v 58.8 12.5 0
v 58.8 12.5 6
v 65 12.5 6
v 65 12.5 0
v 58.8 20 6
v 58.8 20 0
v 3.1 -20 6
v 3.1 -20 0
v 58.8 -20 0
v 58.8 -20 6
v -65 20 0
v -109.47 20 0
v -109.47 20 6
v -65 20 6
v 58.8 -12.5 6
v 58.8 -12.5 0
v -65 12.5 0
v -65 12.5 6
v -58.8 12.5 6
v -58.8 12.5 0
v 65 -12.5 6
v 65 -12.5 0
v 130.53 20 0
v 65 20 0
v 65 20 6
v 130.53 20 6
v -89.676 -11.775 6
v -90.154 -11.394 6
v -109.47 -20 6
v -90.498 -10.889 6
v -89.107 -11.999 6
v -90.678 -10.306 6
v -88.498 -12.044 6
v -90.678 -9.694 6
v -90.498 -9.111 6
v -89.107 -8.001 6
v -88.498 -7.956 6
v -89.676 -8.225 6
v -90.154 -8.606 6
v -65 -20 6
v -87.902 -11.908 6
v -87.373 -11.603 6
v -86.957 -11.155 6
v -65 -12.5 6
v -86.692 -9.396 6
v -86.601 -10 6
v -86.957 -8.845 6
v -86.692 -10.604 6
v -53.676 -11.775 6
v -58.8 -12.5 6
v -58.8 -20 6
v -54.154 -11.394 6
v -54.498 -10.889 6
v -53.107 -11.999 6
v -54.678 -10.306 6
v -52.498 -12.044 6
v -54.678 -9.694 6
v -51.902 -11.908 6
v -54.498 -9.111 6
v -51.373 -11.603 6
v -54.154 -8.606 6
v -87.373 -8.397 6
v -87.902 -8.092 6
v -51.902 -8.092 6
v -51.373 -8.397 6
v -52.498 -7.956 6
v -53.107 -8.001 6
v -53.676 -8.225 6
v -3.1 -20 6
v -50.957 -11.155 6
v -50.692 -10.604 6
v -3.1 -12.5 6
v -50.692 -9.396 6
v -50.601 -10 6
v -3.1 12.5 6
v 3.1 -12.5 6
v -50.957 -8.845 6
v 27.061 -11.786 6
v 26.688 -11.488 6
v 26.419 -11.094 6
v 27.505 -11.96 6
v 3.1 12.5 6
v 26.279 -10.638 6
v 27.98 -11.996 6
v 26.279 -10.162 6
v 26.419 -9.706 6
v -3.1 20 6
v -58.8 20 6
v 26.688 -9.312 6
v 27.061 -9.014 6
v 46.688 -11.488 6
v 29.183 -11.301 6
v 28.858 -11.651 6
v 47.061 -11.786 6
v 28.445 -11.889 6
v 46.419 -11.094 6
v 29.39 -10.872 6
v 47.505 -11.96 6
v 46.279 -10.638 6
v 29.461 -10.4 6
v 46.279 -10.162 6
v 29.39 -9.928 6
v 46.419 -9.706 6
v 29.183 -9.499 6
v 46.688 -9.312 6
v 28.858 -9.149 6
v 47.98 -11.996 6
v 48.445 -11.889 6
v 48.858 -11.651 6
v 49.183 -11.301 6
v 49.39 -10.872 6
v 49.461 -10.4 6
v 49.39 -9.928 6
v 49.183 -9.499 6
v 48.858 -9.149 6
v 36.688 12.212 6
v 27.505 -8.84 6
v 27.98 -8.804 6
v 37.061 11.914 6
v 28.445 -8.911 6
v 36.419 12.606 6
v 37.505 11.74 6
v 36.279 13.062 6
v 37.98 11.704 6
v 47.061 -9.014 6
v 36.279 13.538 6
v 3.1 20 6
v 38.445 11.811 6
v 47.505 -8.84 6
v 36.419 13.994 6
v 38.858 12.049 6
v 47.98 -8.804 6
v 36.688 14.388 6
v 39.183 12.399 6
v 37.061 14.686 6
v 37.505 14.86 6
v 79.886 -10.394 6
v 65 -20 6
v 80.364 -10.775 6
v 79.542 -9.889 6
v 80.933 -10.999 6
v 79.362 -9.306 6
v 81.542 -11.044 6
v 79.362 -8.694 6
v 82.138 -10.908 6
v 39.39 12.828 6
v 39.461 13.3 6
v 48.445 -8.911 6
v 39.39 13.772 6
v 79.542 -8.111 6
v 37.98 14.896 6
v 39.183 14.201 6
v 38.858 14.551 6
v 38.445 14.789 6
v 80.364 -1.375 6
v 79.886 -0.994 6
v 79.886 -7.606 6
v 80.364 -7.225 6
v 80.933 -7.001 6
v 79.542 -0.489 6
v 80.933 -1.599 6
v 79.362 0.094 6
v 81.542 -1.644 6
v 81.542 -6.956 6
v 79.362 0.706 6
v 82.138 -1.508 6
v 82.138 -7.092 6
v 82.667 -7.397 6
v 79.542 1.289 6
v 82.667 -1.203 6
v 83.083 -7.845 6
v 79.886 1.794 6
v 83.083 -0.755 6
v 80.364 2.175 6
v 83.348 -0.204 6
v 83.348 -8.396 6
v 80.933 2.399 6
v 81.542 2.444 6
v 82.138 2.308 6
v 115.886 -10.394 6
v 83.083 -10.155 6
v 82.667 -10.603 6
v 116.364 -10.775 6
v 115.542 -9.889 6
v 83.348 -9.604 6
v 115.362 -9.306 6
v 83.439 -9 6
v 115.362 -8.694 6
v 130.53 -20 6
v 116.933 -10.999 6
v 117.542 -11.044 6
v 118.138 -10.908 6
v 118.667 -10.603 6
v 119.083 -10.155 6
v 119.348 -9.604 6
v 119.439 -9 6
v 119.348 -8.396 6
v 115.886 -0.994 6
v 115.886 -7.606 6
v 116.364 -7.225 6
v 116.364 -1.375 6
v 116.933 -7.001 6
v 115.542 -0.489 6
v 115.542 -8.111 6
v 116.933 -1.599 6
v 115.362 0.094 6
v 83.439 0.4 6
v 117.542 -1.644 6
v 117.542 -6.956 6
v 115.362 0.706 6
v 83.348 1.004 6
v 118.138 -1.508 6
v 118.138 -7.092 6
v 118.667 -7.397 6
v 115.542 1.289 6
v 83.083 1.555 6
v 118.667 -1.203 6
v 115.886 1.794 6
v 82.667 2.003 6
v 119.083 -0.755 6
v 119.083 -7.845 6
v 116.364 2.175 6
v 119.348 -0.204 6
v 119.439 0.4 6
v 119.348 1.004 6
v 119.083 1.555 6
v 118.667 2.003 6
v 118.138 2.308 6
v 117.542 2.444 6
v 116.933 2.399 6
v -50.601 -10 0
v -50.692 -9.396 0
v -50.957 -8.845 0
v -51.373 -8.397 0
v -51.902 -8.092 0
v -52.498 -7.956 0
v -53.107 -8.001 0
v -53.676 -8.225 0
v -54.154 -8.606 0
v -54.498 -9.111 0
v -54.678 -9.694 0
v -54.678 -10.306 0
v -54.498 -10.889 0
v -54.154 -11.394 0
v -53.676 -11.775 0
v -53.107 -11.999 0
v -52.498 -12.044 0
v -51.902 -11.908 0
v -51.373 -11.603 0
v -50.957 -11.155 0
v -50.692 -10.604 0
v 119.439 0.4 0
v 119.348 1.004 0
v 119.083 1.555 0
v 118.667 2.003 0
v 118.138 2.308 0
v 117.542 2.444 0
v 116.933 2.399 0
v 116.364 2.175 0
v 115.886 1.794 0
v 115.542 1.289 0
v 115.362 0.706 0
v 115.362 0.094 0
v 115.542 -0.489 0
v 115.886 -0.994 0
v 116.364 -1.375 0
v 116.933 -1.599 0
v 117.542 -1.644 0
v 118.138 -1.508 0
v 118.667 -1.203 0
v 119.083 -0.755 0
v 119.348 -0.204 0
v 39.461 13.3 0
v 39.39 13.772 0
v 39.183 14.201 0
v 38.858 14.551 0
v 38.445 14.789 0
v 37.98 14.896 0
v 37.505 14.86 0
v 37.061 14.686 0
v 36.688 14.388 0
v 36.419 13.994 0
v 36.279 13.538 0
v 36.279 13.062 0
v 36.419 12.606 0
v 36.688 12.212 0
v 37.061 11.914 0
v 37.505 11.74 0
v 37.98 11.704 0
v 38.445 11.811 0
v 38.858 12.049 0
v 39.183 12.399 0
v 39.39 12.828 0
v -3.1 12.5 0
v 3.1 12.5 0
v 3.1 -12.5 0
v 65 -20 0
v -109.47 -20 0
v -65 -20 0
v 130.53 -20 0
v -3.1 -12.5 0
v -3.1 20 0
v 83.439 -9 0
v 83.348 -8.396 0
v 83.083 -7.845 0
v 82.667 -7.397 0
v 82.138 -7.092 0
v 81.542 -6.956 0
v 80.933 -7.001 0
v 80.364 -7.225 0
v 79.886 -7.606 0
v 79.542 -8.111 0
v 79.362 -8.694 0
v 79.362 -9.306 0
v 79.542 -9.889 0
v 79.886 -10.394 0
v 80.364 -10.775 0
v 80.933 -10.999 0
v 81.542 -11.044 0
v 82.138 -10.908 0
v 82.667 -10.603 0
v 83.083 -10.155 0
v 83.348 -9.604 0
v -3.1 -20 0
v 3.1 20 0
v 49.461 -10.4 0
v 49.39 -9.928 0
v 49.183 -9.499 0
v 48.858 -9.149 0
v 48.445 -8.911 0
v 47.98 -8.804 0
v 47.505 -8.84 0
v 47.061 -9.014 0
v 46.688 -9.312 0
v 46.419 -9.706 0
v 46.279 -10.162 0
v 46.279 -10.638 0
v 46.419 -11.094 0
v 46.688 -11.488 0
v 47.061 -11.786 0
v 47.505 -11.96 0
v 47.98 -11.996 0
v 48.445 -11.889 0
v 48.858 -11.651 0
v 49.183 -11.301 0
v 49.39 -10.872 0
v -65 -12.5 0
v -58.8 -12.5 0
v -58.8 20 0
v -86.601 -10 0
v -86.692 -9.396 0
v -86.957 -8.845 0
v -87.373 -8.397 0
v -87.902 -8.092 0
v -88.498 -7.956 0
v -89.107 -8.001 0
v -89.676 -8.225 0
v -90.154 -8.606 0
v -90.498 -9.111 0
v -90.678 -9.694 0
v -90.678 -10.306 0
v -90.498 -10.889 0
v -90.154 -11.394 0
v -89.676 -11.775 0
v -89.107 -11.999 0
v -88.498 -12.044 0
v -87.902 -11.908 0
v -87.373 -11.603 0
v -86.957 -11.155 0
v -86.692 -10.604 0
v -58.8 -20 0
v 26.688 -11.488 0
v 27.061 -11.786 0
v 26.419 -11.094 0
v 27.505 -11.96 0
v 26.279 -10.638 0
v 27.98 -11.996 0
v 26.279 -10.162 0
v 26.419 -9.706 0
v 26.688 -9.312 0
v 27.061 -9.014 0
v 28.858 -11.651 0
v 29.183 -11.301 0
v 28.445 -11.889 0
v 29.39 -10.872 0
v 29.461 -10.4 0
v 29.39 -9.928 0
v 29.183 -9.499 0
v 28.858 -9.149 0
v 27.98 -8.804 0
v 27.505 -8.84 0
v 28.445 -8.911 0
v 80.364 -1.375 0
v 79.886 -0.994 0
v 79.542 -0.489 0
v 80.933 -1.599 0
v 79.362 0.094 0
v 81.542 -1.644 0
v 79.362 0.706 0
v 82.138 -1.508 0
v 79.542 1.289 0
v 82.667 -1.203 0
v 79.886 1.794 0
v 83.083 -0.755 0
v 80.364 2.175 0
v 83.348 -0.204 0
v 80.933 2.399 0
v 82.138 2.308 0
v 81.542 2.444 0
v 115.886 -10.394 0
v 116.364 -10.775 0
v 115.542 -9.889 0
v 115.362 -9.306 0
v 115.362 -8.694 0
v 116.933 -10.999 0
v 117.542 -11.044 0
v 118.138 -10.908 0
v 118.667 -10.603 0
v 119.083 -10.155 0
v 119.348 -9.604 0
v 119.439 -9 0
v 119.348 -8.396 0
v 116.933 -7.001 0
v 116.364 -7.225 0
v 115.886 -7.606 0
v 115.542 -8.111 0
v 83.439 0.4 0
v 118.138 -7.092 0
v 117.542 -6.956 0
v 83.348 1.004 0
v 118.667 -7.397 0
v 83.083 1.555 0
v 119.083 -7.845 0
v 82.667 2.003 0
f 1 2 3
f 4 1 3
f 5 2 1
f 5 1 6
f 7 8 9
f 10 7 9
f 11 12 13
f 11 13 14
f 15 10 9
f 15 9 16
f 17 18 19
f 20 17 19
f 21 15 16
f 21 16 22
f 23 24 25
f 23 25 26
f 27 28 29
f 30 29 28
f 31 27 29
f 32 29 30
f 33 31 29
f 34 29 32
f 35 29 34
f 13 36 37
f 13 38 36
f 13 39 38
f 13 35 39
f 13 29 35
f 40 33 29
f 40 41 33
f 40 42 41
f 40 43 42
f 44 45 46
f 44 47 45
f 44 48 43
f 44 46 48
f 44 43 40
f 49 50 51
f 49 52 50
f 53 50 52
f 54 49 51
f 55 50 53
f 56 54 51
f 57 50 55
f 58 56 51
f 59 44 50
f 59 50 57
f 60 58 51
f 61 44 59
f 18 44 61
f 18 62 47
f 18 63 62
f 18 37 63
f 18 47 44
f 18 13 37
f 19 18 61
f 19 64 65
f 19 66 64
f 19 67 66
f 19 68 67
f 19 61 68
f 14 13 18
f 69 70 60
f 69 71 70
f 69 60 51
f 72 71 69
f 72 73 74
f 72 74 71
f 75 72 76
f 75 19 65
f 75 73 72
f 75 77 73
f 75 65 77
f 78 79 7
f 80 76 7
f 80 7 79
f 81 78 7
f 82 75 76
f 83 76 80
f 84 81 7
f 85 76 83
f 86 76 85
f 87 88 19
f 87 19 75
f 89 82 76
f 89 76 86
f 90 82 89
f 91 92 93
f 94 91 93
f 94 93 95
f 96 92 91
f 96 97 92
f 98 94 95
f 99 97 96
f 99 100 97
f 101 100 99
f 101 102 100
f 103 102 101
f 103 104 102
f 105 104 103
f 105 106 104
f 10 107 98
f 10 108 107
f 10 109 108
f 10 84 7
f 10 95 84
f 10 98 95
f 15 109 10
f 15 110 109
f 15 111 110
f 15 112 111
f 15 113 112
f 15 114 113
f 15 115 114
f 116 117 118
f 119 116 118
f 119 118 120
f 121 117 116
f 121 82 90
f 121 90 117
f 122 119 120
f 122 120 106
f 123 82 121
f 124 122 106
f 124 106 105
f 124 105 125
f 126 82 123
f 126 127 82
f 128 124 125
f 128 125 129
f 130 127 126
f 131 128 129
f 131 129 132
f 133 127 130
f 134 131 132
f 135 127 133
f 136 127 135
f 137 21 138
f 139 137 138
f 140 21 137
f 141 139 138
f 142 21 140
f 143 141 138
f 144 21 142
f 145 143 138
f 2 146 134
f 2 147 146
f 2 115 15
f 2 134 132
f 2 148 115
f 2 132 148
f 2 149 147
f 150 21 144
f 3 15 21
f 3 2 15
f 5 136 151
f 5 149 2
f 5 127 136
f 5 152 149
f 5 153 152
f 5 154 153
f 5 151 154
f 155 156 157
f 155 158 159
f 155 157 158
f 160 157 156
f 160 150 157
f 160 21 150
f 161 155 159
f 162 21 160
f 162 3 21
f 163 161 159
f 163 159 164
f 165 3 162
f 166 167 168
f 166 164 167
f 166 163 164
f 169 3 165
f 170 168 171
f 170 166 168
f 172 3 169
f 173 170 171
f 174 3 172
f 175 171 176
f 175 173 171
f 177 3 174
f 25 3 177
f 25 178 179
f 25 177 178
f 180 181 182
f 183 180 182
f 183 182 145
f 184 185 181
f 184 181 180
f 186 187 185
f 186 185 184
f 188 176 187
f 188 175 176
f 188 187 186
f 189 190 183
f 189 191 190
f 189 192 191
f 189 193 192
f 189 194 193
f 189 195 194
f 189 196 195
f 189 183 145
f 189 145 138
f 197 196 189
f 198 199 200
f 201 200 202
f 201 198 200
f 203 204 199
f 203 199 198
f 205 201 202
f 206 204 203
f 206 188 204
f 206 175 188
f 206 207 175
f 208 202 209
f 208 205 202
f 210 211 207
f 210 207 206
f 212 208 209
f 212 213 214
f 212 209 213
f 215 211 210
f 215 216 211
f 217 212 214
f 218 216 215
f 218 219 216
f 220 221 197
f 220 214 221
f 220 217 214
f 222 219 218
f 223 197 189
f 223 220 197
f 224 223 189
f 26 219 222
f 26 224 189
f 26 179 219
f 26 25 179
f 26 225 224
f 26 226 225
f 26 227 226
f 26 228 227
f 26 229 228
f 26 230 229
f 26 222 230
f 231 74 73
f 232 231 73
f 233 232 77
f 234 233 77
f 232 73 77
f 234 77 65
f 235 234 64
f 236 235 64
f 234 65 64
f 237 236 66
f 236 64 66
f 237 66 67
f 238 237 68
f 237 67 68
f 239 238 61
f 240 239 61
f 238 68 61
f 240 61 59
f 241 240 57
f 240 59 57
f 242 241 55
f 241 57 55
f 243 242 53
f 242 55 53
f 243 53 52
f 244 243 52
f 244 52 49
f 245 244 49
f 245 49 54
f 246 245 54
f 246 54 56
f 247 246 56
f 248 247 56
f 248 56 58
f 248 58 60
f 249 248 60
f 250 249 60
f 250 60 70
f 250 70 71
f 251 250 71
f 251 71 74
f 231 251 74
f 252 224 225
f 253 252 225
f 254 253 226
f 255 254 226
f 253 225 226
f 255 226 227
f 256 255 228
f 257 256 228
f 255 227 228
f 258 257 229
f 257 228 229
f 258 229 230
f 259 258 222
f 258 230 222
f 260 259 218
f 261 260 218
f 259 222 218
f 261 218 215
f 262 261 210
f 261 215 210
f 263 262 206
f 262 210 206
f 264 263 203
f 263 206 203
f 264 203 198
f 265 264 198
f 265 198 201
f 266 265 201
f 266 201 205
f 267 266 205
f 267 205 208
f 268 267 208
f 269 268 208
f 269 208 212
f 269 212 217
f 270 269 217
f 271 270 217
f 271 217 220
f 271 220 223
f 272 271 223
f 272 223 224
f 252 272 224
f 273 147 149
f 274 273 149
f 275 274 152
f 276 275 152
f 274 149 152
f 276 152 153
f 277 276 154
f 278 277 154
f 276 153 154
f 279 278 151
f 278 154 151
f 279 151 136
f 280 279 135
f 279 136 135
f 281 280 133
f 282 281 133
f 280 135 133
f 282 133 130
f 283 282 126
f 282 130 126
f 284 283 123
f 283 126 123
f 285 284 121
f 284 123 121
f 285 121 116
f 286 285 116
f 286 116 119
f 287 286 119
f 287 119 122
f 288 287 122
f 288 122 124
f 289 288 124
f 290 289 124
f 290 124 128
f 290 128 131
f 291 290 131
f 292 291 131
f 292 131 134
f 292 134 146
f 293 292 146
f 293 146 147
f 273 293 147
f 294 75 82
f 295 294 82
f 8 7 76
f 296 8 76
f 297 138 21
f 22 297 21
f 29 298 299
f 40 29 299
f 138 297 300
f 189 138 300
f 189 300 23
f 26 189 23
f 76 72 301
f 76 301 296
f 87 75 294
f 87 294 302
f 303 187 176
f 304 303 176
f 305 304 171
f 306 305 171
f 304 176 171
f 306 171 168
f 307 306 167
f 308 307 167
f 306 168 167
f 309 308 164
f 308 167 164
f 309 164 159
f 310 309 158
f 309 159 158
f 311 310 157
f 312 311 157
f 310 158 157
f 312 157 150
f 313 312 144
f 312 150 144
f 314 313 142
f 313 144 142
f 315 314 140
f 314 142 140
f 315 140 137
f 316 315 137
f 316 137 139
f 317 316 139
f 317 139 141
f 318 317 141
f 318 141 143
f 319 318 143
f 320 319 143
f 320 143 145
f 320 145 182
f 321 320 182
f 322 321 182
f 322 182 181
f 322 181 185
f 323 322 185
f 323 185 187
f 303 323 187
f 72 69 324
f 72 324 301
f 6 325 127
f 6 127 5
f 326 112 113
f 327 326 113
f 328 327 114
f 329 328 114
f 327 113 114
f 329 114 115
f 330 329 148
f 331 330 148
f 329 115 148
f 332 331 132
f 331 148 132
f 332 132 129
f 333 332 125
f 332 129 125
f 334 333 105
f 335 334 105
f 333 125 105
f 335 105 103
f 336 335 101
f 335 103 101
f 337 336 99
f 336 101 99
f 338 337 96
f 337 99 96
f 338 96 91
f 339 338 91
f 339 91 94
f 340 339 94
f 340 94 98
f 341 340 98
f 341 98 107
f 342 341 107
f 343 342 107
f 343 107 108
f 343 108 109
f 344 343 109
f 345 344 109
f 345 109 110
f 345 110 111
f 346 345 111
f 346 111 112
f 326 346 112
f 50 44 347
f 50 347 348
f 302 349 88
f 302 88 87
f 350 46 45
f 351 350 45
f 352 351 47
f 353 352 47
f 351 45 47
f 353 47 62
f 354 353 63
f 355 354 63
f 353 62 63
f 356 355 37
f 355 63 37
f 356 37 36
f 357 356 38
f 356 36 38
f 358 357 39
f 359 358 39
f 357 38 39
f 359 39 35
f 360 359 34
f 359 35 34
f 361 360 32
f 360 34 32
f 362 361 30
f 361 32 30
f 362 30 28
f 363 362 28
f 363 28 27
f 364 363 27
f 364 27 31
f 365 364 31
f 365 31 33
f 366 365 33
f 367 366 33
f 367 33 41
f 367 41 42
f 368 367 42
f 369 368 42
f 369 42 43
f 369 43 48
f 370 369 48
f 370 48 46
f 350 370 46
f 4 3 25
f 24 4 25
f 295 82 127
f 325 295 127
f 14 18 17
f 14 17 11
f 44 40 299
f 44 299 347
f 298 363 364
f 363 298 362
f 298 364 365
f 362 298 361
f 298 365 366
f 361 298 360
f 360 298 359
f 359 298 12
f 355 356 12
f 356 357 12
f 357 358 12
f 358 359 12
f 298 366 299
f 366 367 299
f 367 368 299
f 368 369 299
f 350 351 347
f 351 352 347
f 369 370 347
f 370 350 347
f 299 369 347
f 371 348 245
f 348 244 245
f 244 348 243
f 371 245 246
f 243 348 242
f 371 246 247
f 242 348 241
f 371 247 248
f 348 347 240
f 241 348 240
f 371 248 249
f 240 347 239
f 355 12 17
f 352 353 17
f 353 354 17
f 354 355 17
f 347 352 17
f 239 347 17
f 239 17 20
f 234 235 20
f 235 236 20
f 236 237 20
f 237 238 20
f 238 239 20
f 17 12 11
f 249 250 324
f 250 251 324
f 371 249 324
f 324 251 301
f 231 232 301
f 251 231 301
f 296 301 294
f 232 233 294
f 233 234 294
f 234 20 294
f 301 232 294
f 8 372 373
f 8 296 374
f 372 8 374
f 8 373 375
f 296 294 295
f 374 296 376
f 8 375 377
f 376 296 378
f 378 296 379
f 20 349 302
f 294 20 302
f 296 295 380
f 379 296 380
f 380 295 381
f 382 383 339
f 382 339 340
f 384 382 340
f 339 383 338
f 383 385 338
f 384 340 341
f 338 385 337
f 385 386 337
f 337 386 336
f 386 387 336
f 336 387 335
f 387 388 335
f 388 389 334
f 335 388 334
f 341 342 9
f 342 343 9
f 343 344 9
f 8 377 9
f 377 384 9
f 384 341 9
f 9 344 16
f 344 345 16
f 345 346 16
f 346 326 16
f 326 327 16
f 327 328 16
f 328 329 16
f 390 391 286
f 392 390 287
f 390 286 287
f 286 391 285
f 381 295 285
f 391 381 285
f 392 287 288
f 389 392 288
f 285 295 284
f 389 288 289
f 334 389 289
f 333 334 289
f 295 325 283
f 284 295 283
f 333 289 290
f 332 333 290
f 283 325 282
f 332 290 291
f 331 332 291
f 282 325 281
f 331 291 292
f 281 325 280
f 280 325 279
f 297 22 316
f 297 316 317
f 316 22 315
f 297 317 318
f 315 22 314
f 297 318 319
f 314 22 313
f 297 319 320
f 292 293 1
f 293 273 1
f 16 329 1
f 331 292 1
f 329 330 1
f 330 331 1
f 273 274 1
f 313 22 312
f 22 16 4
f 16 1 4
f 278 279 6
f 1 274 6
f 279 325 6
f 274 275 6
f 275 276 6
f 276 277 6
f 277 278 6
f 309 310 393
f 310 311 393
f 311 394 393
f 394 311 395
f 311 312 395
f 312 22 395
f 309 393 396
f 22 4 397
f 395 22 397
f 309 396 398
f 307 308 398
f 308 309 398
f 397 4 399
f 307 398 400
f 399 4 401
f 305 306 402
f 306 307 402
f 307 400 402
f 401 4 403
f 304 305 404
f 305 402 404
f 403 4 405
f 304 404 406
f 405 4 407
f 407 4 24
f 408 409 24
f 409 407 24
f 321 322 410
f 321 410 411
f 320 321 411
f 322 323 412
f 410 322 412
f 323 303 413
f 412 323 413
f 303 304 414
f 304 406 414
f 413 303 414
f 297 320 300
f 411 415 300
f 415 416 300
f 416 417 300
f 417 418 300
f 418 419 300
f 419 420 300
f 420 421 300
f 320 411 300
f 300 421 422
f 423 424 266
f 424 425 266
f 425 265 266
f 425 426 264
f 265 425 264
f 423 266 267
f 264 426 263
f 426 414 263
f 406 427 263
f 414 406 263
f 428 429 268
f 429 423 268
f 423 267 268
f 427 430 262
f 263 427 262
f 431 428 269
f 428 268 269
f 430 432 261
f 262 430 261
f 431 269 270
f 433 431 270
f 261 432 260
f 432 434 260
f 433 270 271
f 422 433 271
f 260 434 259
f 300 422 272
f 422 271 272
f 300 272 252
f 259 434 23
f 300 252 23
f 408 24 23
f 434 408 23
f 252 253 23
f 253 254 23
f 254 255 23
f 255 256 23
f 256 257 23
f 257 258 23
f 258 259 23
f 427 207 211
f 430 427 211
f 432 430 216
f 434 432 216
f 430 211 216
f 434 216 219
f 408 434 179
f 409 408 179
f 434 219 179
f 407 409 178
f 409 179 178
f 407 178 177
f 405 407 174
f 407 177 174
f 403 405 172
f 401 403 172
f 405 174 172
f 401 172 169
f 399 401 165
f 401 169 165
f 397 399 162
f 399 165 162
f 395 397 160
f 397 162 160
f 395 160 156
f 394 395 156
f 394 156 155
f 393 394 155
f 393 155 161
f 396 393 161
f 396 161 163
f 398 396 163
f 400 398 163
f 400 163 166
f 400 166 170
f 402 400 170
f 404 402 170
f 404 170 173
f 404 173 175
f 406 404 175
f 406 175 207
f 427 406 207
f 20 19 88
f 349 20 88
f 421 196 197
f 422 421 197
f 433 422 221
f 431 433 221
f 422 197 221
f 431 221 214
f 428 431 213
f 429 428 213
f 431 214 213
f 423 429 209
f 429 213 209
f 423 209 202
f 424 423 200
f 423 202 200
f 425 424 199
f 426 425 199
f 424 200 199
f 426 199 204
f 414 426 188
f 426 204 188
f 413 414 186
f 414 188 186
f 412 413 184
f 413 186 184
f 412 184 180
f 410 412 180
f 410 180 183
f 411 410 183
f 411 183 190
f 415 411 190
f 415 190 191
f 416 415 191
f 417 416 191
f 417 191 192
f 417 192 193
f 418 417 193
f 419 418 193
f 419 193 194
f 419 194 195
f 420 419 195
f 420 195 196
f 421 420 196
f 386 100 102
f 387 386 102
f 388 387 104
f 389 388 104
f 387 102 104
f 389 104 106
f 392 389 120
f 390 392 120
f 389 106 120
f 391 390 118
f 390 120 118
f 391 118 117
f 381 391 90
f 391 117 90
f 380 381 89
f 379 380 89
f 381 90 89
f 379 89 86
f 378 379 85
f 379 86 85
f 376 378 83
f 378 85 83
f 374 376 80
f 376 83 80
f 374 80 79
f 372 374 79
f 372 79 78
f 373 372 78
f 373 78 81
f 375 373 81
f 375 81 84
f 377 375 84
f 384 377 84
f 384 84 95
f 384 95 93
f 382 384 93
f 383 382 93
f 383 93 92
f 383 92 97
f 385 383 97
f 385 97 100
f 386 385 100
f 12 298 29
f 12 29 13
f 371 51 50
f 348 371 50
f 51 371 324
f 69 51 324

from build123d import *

# Parameters (mm, degrees)
F0_W     = 240
F0_H     = 40
F1_DEPTH = 6
F2_W     = 6.2
F2_H     = 7.5
F3_DEPTH = 6
F4_R     = 1.6
F5_R     = 2.05
F6_R     = 2.05
F7_DEPTH = 6.001
F8_DEPTH = 6.001


with BuildPart() as f1:
    # F0 (on Top) → F1 (new body)
    with BuildSketch(Plane.XY):
        with Locations((10.5305, 0)):
            Rectangle(F0_W, F0_H)
    extrude(amount=F1_DEPTH)

    # F2 (on face) → F3 (cut, through all)
    with BuildSketch(Plane.XY.offset(6)):
        with Locations((0, -16.25)):
            Rectangle(F2_W, F2_H)
        with Locations((-61.9, -16.25)):
            Rectangle(F2_W, F2_H)
        with Locations((61.9, -16.25)):
            Rectangle(F2_W, F2_H)
        with Locations((0, 16.25)):
            Rectangle(F2_W, F2_H)
        with Locations((-61.9, 16.25)):
            Rectangle(F2_W, F2_H)
        with Locations((61.9, 16.25)):
            Rectangle(F2_W, F2_H)
    extrude(amount=-F3_DEPTH, mode=Mode.SUBTRACT)

    # F4 (on face) + F5 (on face) + F6 (on face) → F7 (cut, through all)
    with BuildSketch(Plane.XY.offset(6)):
        with Locations((27.860826, -10.4)):
            Circle(F4_R)
        with Locations((47.860826, -10.4)):
            Circle(F4_R)
        with Locations((37.860826, 13.3)):
            Circle(F4_R)
    with BuildSketch(Plane.XY.offset(6)):
        with Locations((-88.650754, -10)):
            Circle(F5_R)
        with Locations((-52.650754, -10)):
            Circle(F5_R)
    with BuildSketch(Plane.XY.offset(6)):
        with Locations((81.389095, -9)):
            Circle(F6_R)
        with Locations((117.389095, -9)):
            Circle(F6_R)
        with Locations((81.389095, 0.4)):
            Circle(F6_R)
        with Locations((117.389095, 0.4)):
            Circle(F6_R)
    extrude(amount=-F7_DEPTH, mode=Mode.SUBTRACT)

    # F6 (on face) + F5 (on face) + F4 (on face) → F8 (cut, through all)
    with BuildSketch(Plane.XY.offset(6)):
        with Locations((81.389095, -9)):
            Circle(F6_R)
        with Locations((117.389095, -9)):
            Circle(F6_R)
        with Locations((81.389095, 0.4)):
            Circle(F6_R)
        with Locations((117.389095, 0.4)):
            Circle(F6_R)
    with BuildSketch(Plane.XY.offset(6)):
        with Locations((-88.650754, -10)):
            Circle(F5_R)
        with Locations((-52.650754, -10)):
            Circle(F5_R)
    with BuildSketch(Plane.XY.offset(6)):
        with Locations((27.860826, -10.4)):
            Circle(F4_R)
        with Locations((47.860826, -10.4)):
            Circle(F4_R)
        with Locations((37.860826, 13.3)):
            Circle(F4_R)
    extrude(amount=-F8_DEPTH, mode=Mode.SUBTRACT)


solid = f1.part
